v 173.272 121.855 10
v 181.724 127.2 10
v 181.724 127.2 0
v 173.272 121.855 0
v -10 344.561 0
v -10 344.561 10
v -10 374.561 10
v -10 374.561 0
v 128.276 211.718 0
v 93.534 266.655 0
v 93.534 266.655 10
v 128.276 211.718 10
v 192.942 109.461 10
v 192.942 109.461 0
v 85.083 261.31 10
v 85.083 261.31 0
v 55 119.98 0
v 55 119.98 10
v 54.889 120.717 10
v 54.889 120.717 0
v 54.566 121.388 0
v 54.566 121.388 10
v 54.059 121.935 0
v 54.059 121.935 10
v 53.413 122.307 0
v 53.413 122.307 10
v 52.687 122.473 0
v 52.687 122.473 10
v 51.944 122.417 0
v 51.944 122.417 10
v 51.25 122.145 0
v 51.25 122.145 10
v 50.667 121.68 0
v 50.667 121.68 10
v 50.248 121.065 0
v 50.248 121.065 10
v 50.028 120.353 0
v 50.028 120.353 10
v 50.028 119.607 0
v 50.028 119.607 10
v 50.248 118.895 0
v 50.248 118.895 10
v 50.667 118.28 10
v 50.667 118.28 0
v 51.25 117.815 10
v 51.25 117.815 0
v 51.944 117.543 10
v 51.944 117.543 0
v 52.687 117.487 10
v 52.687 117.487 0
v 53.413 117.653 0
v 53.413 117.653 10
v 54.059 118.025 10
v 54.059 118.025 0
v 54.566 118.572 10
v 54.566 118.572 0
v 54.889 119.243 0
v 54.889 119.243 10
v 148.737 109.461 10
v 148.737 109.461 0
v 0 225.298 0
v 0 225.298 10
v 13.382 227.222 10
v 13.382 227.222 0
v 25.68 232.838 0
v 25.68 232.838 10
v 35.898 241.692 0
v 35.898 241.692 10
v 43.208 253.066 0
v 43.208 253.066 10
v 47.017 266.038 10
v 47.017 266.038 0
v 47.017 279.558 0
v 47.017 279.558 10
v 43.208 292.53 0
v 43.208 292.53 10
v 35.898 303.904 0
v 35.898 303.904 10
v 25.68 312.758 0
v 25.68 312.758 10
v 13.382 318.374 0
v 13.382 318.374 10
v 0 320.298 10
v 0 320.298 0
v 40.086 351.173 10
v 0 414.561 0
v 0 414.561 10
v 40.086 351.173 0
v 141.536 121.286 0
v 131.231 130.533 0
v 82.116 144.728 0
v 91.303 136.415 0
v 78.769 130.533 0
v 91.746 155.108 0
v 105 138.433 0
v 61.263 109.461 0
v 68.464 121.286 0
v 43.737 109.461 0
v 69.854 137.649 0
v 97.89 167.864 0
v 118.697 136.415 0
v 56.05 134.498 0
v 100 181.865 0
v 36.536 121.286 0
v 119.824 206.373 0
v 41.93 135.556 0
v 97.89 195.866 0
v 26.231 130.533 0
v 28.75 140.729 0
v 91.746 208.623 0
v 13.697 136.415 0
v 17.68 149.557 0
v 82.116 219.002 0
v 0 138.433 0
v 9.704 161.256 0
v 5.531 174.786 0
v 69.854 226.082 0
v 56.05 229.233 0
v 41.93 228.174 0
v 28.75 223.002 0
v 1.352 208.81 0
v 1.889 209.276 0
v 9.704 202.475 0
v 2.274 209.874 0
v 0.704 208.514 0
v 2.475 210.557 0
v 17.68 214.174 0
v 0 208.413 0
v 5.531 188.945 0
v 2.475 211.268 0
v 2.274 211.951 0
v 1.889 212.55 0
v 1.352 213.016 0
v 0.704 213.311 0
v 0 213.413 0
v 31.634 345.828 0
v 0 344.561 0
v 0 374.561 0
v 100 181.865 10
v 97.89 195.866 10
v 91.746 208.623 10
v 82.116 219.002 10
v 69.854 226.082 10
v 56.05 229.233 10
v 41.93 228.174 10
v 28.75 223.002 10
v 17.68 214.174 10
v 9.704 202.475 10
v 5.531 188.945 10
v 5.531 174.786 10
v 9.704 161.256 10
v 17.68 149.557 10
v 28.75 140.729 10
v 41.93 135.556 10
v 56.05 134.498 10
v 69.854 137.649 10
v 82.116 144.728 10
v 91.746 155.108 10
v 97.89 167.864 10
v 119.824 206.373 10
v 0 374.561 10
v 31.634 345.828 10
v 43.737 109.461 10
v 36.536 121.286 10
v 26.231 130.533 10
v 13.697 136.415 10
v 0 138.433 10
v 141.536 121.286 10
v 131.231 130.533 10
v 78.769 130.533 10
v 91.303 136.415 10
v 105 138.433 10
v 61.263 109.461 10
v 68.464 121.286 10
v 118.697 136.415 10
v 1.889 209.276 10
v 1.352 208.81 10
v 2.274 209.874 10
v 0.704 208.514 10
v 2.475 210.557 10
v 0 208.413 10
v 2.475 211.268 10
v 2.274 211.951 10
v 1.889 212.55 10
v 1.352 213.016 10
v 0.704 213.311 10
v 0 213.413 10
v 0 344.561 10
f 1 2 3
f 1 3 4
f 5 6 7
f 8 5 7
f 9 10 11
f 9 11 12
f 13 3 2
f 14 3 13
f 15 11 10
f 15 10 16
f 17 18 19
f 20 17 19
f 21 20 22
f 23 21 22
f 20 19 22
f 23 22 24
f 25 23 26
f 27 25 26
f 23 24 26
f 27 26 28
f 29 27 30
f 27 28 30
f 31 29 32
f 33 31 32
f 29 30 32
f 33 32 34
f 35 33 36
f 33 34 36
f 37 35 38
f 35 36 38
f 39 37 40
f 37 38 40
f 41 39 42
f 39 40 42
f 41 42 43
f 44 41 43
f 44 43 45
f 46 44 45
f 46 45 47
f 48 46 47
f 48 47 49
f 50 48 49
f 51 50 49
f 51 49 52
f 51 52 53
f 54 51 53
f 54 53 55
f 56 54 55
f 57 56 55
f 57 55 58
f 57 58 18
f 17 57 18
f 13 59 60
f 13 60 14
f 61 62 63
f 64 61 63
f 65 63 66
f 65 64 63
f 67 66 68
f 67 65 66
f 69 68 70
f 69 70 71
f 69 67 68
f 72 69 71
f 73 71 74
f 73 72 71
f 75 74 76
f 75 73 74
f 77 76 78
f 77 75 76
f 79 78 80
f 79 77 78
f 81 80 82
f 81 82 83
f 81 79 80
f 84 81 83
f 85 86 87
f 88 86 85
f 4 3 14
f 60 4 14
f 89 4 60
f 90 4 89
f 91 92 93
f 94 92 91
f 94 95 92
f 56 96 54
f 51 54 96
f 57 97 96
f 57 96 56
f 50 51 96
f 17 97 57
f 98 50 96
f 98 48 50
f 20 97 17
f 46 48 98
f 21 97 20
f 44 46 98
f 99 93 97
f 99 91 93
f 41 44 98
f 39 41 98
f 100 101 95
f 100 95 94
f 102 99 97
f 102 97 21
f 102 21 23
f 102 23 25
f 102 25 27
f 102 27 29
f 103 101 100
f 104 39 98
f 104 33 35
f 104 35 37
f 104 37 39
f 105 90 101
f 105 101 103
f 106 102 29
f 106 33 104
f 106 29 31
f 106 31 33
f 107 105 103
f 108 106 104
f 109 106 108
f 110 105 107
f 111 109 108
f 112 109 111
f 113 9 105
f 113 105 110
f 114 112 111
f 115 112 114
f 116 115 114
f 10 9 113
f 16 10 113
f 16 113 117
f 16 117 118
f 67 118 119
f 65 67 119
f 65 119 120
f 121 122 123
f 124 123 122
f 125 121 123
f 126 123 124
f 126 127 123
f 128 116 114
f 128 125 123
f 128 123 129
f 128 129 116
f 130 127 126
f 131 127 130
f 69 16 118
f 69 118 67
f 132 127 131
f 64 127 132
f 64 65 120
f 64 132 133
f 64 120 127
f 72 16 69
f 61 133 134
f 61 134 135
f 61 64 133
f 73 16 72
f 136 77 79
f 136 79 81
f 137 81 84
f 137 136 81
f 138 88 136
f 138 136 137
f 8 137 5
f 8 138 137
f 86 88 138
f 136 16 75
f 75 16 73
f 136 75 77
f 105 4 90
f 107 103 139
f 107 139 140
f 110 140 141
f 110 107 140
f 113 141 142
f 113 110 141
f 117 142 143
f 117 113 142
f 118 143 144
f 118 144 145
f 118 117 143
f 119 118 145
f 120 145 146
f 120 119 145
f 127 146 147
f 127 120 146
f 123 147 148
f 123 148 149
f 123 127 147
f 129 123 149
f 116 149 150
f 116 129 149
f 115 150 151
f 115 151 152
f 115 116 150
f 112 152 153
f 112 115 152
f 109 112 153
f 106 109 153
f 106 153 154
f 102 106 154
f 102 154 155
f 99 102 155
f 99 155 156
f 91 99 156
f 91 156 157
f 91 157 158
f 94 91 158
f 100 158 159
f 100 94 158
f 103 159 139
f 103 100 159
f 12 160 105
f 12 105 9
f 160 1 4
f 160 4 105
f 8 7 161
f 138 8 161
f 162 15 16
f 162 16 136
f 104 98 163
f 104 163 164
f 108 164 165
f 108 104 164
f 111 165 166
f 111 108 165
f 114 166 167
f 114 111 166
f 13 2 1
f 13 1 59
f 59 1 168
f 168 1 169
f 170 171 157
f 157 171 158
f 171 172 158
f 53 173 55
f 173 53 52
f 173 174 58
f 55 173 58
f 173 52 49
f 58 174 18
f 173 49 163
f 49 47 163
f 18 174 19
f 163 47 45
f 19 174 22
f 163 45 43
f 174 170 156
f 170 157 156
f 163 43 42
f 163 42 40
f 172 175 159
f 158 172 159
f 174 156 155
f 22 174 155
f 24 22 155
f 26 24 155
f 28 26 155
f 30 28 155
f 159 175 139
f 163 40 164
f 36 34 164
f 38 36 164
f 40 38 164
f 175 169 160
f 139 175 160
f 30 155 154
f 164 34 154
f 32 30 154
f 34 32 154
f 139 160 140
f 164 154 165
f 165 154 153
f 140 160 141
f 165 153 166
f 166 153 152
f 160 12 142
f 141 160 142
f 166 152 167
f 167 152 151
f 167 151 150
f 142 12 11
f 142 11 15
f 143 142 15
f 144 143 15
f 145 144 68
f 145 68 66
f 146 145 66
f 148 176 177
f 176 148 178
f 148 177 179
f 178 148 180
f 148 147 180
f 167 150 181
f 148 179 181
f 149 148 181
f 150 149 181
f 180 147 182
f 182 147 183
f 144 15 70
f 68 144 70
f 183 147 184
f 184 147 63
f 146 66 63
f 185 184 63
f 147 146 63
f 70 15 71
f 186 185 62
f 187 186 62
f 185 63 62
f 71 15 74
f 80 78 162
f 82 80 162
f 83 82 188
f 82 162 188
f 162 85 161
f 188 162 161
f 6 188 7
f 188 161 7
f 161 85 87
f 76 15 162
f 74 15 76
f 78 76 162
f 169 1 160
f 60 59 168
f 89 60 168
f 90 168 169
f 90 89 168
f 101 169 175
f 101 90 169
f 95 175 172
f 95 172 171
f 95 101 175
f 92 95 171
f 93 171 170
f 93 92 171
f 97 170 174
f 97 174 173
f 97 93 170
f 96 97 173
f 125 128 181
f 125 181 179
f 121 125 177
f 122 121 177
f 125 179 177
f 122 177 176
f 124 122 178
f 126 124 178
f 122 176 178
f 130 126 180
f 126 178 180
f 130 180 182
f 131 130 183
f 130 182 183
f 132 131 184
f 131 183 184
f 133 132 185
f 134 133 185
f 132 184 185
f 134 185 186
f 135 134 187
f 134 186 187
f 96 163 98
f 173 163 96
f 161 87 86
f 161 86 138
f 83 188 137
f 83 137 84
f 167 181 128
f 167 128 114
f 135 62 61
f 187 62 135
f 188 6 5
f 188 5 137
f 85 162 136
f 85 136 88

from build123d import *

# Parameters (mm, degrees)
ESQUISSE1_R             = 47.5
BOSS_EXTRU_1_DEPTH      = 10
ESQUISSE3_W             = 100
ESQUISSE3_H             = 10
ENL_V_MAT_EXTRU_1_DEPTH = 11
ESQUISSE4_R             = 2.5
ENL_V_MAT_EXTRU_2_DEPTH = 11
ESQUISSE6_W             = 150
ESQUISSE6_H             = 120
BOSS_EXTRU_2_DEPTH      = 10
ESQUISSE7_W             = 10
ESQUISSE7_H             = 50
ESQUISSE7_W_2           = 50
ESQUISSE7_H_2           = 9.570800355
ENL_V_MAT_EXTRU_3_DEPTH = 10
ENL_V_MAT_EXTRU_5_DEPTH = 10
ESQUISSE11_W            = 10
ESQUISSE11_H            = 30
BOSS_EXTRU_4_DEPTH      = 10


with BuildPart() as part:
    # Esquisse1 → Boss.-Extru.1 (new body)
    with BuildSketch(Plane.XY):
        Polygon((-310, -75.642859016), (0, 414.561180135), (310, -75.642859016), align=None)
        with Locations((-157.5, 0)):
            Circle(ESQUISSE1_R, mode=Mode.SUBTRACT)
        with Locations((-52.5, 0)):
            Circle(ESQUISSE1_R, mode=Mode.SUBTRACT)
        with Locations((52.5, 0)):
            Circle(ESQUISSE1_R, mode=Mode.SUBTRACT)
        with Locations((157.5, 0)):
            Circle(ESQUISSE1_R, mode=Mode.SUBTRACT)
        with Locations((-105, 90.932667397)):
            Circle(ESQUISSE1_R, mode=Mode.SUBTRACT)
        with Locations((0, 90.932667397)):
            Circle(ESQUISSE1_R, mode=Mode.SUBTRACT)
        with Locations((105, 90.932667397)):
            Circle(ESQUISSE1_R, mode=Mode.SUBTRACT)
        with Locations((-52.5, 181.865334795)):
            Circle(ESQUISSE1_R, mode=Mode.SUBTRACT)
        with Locations((52.5, 181.865334795)):
            Circle(ESQUISSE1_R, mode=Mode.SUBTRACT)
        with Locations((0, 272.798002192)):
            Circle(ESQUISSE1_R, mode=Mode.SUBTRACT)
    extrude(amount=BOSS_EXTRU_1_DEPTH)

    # Esquisse3 → Enlèv. mat.-Extru.1 (cut, through all)
    with BuildSketch(Plane.XY.offset(10)):
        Polygon((-269.913793103, -12.254405678), (-261.461999325, -17.599233264), (-208.013723463, 66.918704521), (-216.465517241, 72.263532107), align=None)
        Polygon((-181.724137931, 127.200191667), (-173.272344153, 121.855364081), (-119.82406829, 206.373301865), (-128.275862069, 211.718129452), align=None)
        Polygon((-93.534482759, 266.654789012), (-85.08268898, 261.309961425), (-31.634413118, 345.82789921), (-40.086206897, 351.172726796), align=None)
        Polygon((269.913793103, -12.254405678), (261.461999325, -17.599233264), (208.013723463, 66.918704521), (216.465517241, 72.263532107), align=None)
        Polygon((181.724137931, 127.200191667), (173.272344153, 121.855364081), (119.82406829, 206.373301865), (128.275862069, 211.718129452), align=None)
        Polygon((93.534482759, 266.654789012), (85.08268898, 261.309961425), (31.634413118, 345.82789921), (40.086206897, 351.172726796), align=None)
        with Locations((-160, -70.642859016)):
            Rectangle(ESQUISSE3_W, ESQUISSE3_H)
        with Locations((160, -70.642859016)):
            Rectangle(ESQUISSE3_W, ESQUISSE3_H)
    extrude(amount=-ENL_V_MAT_EXTRU_1_DEPTH, mode=Mode.SUBTRACT)

    # Esquisse4 → Enlèv. mat.-Extru.2 (cut, through all)
    with BuildSketch(Plane.XY.offset(10)):
        with Locations((-157.5, -55.642859016)):
            Circle(ESQUISSE4_R)
        with Locations((-52.5, -55.642859016)):
            Circle(ESQUISSE4_R)
        with Locations((52.5, -55.642859016)):
            Circle(ESQUISSE4_R)
        with Locations((157.5, -55.642859016)):
            Circle(ESQUISSE4_R)
        with Locations((-105, 29.047375097)):
            Circle(ESQUISSE4_R)
        with Locations((0, 29.047375097)):
            Circle(ESQUISSE4_R)
        with Locations((105, 29.047375097)):
            Circle(ESQUISSE4_R)
        with Locations((-52.5, 119.980042494)):
            Circle(ESQUISSE4_R)
        with Locations((52.5, 119.980042494)):
            Circle(ESQUISSE4_R)
        with Locations((0, 210.912709891)):
            Circle(ESQUISSE4_R)
    extrude(amount=-ENL_V_MAT_EXTRU_2_DEPTH, mode=Mode.SUBTRACT)

    # Esquisse6 → Boss.-Extru.2 (add)
    with BuildSketch(Plane.XY.offset(10)):
        with Locations((0, -135.642859016)):
            Rectangle(ESQUISSE6_W, ESQUISSE6_H)
    extrude(amount=-BOSS_EXTRU_2_DEPTH)

    # Esquisse7 → Enlèv. mat.-Extru.3 (cut)
    with BuildSketch(Plane.XY.offset(10)):
        with Locations((-70, -135.642859016)):
            Rectangle(ESQUISSE7_W, ESQUISSE7_H)
        with Locations((0, -190.857458839)):
            Rectangle(ESQUISSE7_W_2, ESQUISSE7_H_2)
        with Locations((70, -135.642859016)):
            Rectangle(ESQUISSE7_W, ESQUISSE7_H)
    extrude(amount=-ENL_V_MAT_EXTRU_3_DEPTH, mode=Mode.SUBTRACT)

    # Esquisse10 → Enlèv. mat.-Extru.5 (cut)
    with BuildSketch(Plane.XY.offset(10)):
        Polygon((0, 414.561180135), (0, 109.461180135), (337.106568203, 109.461180135), (337.106568203, -228.052583807), (-388.969117157, -228.052583807), (-388.969117157, 414.561180135), align=None)
    extrude(amount=-ENL_V_MAT_EXTRU_5_DEPTH, mode=Mode.SUBTRACT)

    # Esquisse11 → Boss.-Extru.4 (add)
    with BuildSketch(Plane.XY.offset(10)):
        with Locations((-5, 359.561180135)):
            Rectangle(ESQUISSE11_W, ESQUISSE11_H)
    extrude(amount=-BOSS_EXTRU_4_DEPTH)


solid = part.part
